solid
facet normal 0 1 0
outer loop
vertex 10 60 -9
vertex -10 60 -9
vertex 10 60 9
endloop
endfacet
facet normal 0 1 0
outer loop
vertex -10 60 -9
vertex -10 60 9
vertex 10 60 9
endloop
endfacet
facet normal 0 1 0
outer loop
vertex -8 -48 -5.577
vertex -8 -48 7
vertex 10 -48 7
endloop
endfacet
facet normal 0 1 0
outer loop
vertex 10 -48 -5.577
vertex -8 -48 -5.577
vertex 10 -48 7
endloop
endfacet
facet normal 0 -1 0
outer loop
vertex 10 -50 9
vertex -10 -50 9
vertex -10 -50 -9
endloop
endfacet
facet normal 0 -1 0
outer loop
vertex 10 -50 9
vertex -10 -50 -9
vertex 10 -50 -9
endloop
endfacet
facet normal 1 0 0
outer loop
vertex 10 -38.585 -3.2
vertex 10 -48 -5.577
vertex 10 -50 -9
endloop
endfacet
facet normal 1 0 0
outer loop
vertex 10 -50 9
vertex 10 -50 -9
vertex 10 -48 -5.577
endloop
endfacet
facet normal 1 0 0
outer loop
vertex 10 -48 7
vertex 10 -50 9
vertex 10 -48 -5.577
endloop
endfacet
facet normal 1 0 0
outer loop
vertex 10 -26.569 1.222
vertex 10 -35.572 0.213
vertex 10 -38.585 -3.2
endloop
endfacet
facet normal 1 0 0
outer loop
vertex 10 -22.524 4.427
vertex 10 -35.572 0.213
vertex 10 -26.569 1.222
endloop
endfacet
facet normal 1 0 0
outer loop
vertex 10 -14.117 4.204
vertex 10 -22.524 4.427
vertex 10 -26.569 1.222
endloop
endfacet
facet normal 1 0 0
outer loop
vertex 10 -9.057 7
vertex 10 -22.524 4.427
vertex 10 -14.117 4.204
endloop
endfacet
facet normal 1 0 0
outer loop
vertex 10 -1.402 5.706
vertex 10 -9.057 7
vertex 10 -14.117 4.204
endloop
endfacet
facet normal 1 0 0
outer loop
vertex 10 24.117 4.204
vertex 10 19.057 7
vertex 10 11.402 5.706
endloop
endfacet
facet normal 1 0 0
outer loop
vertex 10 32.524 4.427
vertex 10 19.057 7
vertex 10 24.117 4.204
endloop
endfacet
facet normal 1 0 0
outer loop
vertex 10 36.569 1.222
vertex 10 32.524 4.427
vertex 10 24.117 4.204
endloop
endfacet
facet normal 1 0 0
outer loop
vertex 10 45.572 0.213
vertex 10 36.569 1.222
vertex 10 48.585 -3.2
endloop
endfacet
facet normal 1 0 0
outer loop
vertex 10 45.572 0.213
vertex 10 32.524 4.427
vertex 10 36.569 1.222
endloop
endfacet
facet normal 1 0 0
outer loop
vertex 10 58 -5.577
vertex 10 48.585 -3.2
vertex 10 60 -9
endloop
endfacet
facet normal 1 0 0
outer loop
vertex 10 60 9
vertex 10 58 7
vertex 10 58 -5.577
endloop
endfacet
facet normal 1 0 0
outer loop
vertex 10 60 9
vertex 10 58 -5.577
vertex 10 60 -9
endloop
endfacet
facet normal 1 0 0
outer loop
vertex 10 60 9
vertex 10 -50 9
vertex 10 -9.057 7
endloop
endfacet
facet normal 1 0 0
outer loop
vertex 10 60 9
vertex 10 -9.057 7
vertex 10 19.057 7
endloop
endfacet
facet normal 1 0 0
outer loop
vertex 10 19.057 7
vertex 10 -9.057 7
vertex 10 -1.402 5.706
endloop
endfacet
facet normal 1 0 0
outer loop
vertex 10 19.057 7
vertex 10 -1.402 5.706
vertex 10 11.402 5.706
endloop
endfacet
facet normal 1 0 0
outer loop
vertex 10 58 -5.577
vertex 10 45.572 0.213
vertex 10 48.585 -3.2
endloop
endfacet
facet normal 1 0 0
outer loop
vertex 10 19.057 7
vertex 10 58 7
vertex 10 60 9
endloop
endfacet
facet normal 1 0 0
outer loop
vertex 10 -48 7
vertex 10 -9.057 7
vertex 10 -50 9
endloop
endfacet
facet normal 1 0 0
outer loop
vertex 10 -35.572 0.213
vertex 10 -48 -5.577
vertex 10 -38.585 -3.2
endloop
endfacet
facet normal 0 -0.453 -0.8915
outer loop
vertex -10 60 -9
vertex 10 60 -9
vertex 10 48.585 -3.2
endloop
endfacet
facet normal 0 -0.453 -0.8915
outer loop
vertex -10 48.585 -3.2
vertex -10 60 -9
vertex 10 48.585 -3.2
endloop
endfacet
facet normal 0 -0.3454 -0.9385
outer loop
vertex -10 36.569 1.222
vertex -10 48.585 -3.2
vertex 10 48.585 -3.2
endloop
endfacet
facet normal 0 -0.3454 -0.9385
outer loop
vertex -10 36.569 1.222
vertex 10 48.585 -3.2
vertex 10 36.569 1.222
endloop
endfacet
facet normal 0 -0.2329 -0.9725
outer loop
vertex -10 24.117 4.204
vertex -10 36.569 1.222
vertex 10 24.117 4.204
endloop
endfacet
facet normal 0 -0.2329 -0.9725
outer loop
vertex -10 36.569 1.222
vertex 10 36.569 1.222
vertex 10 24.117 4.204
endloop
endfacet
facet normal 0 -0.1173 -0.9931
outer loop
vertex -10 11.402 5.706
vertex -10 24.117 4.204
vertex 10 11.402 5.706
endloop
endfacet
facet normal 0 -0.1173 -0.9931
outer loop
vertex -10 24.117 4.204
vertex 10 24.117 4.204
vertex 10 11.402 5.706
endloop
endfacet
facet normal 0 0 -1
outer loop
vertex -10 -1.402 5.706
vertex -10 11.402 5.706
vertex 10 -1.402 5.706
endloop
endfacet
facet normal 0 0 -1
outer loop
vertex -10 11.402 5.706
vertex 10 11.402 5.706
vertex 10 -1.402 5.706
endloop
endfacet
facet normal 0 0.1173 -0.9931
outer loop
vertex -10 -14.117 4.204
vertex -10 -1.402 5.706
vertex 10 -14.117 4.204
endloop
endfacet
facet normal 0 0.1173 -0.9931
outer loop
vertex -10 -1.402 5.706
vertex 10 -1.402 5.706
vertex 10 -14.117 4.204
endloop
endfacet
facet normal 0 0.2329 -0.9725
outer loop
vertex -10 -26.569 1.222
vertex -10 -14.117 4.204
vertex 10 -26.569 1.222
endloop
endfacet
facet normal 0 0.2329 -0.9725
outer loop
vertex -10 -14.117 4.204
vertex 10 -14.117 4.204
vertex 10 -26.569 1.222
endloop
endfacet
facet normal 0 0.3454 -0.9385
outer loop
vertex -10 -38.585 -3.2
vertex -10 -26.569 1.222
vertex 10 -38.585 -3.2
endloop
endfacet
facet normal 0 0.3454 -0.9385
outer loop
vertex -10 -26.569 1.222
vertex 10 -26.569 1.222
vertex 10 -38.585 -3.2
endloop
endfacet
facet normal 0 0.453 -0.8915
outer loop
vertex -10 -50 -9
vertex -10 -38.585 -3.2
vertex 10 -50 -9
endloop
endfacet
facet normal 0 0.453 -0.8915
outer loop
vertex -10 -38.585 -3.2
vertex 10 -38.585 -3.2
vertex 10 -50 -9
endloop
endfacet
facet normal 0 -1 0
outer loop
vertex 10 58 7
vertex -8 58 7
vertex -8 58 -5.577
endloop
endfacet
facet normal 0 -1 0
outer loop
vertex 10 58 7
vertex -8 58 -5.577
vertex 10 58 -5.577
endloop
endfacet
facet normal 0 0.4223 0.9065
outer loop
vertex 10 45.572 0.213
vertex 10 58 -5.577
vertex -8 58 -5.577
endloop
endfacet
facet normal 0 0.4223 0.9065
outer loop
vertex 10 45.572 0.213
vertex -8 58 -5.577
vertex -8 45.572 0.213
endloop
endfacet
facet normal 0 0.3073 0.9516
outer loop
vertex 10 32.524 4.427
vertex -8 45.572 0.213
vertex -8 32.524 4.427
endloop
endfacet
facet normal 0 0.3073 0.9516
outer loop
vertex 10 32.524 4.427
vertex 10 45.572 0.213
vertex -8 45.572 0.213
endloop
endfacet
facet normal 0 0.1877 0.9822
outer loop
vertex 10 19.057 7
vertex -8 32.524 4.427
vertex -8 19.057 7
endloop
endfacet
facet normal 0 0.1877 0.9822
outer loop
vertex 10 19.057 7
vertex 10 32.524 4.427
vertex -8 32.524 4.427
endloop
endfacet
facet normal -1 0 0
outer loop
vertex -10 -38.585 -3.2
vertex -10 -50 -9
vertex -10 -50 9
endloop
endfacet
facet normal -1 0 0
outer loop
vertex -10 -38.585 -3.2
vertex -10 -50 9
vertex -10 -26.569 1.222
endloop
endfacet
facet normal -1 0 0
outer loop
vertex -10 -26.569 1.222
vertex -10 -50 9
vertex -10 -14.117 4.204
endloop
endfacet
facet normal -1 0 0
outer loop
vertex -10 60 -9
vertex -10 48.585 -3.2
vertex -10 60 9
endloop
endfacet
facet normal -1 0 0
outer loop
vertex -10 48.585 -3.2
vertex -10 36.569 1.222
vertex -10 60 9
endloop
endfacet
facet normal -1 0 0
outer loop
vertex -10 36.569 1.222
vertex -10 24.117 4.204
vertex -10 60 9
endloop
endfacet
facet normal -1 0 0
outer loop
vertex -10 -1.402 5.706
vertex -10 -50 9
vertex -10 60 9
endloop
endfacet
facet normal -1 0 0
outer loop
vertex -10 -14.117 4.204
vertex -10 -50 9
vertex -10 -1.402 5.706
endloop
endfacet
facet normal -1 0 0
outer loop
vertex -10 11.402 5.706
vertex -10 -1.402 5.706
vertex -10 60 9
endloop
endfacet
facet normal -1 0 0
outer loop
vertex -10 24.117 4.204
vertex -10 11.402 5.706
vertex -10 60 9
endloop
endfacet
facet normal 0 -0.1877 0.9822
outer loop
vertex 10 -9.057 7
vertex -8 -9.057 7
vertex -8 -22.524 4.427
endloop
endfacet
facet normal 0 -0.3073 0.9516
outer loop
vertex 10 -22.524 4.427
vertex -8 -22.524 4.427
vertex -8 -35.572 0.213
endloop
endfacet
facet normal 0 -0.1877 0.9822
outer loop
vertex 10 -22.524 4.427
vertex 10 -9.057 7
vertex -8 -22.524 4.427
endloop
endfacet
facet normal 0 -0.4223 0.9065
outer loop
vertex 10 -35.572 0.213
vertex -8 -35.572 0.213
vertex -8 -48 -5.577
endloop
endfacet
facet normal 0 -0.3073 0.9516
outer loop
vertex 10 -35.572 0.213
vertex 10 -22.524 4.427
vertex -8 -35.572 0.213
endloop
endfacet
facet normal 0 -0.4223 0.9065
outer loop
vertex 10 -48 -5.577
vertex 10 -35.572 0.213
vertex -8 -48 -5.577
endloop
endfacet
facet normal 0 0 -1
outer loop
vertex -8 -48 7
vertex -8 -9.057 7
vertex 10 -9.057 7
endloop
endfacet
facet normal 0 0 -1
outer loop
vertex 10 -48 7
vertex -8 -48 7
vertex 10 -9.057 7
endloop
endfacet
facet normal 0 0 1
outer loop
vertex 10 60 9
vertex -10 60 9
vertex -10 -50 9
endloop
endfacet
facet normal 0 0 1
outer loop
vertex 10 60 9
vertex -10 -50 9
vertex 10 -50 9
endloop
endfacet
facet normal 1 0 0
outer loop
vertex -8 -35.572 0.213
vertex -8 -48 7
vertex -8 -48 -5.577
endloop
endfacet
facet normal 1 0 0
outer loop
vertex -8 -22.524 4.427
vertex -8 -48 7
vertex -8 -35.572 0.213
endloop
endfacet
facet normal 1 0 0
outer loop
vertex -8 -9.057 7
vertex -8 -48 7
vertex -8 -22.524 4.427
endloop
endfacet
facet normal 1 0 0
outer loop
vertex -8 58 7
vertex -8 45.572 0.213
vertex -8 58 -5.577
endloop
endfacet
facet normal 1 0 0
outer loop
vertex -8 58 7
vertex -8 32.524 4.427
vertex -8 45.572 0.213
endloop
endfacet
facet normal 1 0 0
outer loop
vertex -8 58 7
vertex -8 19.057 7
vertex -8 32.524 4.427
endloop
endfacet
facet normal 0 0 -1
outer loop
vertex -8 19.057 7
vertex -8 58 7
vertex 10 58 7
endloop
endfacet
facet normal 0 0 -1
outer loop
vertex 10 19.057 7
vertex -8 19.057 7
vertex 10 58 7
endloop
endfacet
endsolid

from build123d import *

# Parameters (mm, degrees)
F0_W     = 20
F0_H     = 110
F1_DEPTH = 9
F3_DEPTH = 20
F4_T     = -2


with BuildPart() as f1:
    # F0 (on Top) → F1 (new body, symmetric)
    with BuildSketch(Plane.XY):
        with Locations((0, 5)):
            Rectangle(F0_W, F0_H)
    extrude(amount=F1_DEPTH, both=True)

    # F2 (on face) → F3 (cut)
    with BuildSketch(Plane.YZ.offset(10)):
        with BuildLine():
            ThreePointArc((-50, -9), (-49.2494239601, -197.6473192465), (114, -103.1063228481))
            ThreePointArc((114, -103.1063228481), (99.5409963984, -48.8568988881), (60, -9))
            Line((60, -9), (-50, -9))
        make_face()
        with BuildLine():
            Line((-50, -9), (60, -9))
            ThreePointArc((60, -9), (5, 5.8936771519), (-50, -9))
        make_face()
    extrude(amount=-F3_DEPTH, mode=Mode.SUBTRACT)

    # F4
    f4_openings = [f1.faces().sort_by_distance(p)[0] for p in [
        (10, -48.88537, 0),
    ]]
    offset(amount=F4_T, openings=f4_openings)


solid = f1.part
